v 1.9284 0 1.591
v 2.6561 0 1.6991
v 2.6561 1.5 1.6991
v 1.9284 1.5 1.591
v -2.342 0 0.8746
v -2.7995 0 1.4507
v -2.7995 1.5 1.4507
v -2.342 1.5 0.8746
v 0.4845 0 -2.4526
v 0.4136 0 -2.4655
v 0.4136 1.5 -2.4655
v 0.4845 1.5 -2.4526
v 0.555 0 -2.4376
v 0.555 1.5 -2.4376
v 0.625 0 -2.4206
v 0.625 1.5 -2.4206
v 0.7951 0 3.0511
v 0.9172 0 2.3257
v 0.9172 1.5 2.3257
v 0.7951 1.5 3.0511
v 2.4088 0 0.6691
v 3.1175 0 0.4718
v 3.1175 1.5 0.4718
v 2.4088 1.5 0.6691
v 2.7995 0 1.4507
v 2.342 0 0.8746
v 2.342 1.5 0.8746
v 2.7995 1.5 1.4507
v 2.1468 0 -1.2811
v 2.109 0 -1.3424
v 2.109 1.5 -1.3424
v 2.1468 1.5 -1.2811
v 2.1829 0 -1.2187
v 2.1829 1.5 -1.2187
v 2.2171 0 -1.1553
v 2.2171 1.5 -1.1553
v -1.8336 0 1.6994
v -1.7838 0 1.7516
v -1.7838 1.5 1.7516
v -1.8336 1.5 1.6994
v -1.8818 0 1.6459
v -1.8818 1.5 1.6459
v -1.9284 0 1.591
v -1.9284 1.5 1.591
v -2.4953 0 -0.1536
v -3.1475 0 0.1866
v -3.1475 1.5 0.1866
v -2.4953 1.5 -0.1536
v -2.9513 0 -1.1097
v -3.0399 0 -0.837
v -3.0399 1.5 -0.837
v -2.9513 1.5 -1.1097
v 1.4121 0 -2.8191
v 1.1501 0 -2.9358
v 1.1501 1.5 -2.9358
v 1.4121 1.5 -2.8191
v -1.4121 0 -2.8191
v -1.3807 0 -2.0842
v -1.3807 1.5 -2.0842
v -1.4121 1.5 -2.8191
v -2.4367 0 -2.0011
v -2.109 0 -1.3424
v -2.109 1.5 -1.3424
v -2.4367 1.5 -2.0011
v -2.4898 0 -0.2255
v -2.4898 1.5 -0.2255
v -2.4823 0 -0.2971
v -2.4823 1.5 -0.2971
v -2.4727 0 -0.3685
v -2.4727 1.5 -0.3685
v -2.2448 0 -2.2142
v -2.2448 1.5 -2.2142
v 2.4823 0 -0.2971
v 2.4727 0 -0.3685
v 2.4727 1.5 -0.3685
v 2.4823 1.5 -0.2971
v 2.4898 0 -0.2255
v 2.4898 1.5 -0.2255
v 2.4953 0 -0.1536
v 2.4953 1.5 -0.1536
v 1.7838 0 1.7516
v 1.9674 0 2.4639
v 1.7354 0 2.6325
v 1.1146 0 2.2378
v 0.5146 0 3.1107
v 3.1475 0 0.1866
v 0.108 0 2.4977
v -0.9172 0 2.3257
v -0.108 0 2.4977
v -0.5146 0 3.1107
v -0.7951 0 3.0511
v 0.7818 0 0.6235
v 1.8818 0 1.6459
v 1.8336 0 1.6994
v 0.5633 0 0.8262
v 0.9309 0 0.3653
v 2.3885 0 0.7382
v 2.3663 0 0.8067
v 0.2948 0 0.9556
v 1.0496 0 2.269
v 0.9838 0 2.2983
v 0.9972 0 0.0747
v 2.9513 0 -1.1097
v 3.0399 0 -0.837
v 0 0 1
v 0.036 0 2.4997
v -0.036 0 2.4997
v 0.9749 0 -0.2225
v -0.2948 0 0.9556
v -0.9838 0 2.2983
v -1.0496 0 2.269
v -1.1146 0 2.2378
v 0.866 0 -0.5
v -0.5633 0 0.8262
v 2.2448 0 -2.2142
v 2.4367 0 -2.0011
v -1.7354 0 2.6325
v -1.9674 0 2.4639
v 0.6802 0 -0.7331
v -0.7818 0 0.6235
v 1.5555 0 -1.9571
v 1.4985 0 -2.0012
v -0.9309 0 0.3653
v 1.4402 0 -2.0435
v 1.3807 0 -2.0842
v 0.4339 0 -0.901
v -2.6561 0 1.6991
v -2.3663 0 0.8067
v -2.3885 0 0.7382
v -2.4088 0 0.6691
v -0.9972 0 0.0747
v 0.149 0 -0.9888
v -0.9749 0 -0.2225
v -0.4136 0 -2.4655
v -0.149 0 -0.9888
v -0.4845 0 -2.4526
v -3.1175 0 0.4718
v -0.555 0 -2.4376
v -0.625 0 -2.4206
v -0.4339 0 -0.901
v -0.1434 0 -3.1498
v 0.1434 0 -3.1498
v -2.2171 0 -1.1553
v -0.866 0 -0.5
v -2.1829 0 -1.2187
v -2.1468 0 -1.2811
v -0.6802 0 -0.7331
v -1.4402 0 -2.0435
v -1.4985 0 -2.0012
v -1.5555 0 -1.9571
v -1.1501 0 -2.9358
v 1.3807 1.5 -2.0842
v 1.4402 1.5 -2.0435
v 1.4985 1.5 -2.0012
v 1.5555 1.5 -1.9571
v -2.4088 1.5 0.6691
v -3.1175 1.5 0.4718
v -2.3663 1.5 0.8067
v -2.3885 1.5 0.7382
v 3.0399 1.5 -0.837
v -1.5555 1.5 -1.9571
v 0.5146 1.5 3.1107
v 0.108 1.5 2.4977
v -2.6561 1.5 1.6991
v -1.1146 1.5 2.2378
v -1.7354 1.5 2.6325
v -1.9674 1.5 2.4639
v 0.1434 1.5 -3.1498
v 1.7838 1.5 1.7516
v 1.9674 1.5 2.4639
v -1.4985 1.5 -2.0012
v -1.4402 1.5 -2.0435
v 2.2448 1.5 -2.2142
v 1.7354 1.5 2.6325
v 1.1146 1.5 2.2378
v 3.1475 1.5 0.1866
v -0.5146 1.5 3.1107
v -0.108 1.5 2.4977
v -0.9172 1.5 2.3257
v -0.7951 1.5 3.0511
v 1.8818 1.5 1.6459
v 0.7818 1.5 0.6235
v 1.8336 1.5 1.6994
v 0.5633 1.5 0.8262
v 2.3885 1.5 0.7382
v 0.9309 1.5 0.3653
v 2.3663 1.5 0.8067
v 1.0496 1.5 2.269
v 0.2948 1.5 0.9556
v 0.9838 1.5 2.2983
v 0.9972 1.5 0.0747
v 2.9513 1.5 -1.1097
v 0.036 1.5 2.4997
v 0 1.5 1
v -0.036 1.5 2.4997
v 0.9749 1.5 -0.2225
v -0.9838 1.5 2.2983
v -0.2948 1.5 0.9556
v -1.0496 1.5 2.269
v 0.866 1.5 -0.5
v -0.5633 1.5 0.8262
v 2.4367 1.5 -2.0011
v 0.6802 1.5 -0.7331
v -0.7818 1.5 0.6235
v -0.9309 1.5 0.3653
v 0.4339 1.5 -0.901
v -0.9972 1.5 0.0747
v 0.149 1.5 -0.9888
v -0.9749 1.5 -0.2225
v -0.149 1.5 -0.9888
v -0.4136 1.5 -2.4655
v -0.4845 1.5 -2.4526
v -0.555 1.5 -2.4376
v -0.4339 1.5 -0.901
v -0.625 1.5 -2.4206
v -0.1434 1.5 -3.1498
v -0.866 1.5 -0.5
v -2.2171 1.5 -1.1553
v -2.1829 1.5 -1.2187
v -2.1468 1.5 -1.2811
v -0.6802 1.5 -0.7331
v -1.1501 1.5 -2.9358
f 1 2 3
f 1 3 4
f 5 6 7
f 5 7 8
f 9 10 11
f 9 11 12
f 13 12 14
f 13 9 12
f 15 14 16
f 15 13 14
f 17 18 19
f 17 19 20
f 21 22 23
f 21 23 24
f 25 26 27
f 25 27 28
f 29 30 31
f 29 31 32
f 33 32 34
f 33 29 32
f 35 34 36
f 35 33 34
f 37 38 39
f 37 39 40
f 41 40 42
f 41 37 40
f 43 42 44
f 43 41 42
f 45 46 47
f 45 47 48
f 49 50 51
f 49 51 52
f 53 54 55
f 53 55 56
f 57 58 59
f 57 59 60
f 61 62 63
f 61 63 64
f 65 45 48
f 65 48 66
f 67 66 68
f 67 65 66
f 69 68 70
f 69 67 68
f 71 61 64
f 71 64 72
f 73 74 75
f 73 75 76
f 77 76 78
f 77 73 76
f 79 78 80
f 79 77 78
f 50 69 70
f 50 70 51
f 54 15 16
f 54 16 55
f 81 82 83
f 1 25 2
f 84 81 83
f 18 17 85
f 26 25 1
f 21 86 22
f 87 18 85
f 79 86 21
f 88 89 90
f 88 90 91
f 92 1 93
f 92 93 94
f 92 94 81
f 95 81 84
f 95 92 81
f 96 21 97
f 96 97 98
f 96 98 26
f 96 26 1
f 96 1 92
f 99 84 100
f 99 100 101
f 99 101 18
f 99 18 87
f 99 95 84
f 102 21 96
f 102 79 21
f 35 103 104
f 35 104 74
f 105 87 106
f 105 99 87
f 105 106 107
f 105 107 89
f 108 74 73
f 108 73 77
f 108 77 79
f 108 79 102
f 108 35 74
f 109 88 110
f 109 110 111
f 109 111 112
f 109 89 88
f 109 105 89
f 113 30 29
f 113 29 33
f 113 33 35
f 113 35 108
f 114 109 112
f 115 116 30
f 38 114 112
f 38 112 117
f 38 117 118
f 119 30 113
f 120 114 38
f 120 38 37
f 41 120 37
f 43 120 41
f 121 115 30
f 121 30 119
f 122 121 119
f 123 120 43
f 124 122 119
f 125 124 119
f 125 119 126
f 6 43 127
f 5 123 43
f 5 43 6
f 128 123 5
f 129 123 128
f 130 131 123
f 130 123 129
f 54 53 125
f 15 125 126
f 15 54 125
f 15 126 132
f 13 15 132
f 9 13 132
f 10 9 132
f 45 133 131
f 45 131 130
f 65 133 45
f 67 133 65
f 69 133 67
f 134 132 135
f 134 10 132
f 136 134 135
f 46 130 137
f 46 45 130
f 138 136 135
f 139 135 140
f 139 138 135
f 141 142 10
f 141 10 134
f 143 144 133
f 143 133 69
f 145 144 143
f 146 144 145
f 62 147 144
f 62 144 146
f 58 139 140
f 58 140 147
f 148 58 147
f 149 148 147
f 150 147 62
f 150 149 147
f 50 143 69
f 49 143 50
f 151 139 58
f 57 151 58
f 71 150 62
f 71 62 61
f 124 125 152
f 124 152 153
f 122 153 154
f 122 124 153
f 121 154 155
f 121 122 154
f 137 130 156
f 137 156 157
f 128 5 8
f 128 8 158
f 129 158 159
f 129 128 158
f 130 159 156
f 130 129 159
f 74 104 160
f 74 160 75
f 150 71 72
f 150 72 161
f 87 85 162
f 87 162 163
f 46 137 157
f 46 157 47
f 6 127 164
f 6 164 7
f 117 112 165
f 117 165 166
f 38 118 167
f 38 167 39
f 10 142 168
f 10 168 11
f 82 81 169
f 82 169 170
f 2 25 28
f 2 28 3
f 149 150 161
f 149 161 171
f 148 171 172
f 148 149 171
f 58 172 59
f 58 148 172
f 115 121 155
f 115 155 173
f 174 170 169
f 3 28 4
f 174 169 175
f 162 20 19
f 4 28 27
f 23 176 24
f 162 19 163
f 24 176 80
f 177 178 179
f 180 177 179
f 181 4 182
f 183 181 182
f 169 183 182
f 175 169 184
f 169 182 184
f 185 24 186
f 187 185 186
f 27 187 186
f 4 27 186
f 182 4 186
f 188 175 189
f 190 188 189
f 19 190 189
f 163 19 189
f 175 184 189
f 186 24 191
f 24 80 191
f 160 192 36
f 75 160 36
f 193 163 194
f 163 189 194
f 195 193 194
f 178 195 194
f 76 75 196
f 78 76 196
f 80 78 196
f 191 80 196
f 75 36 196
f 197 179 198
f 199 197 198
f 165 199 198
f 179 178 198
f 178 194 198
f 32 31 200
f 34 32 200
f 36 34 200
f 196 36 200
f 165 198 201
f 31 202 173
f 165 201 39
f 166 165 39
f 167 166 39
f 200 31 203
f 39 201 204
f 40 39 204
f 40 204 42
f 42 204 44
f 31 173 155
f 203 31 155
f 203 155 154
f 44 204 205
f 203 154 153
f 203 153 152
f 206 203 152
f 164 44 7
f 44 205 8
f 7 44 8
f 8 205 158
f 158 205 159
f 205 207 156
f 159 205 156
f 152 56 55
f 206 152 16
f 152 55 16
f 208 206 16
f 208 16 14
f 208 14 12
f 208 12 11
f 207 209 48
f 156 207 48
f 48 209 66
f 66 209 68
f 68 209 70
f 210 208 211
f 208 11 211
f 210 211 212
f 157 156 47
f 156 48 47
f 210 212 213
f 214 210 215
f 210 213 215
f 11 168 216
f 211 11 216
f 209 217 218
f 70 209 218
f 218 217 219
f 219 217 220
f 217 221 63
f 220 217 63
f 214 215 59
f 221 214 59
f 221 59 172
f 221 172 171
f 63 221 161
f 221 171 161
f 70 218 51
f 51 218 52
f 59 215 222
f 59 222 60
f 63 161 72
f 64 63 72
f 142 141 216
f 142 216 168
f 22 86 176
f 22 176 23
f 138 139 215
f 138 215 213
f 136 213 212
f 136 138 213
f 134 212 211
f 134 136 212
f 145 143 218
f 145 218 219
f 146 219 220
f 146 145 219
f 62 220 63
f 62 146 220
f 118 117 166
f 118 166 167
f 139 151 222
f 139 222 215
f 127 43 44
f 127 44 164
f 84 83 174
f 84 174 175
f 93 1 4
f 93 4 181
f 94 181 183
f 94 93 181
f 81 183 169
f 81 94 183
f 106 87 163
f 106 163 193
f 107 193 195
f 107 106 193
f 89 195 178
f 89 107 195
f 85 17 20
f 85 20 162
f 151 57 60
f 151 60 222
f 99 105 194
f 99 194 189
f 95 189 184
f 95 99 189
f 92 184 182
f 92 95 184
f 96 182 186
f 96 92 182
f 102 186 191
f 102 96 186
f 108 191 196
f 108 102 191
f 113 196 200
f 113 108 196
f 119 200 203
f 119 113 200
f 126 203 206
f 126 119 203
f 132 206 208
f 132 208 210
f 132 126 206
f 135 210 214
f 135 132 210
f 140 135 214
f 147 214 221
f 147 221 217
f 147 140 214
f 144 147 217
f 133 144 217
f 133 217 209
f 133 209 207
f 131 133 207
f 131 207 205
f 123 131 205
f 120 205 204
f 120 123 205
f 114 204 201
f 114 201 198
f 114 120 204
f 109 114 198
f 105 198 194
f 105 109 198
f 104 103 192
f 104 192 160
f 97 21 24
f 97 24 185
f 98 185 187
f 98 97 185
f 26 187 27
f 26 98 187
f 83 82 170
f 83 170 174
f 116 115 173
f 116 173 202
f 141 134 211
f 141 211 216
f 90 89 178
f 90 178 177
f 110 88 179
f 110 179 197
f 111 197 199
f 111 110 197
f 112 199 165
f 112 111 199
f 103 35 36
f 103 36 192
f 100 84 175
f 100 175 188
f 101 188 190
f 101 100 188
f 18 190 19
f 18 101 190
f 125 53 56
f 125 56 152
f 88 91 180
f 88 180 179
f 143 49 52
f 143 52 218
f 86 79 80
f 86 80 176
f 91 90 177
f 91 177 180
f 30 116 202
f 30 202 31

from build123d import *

# Parameters (mm, degrees)
SKETCH1_R           = 1
BOSS_EXTRUDE1_DEPTH = 1.5


with BuildPart() as part:
    # Sketch1 → Boss-Extrude1 (new body)
    with BuildSketch(Plane(origin=(0, 0, 0), x_dir=(1, 0, 0), z_dir=(0, 1, 0))):
        with BuildLine():
            Line((-0.4136064, 2.465548569), (-0.143377771, 3.149767964))
            Line((-0.143377771, 3.149767964), (0.143377771, 3.149767964))
            Line((0.143377771, 3.149767964), (0.4136064, 2.465548569))
            ThreePointArc((0.4136064, 2.465548569), (0.519779227, 2.445369002), (0.6249807, 2.420619575))
            Line((0.6249807, 2.420619575), (1.150143936, 2.935773209))
            Line((1.150143936, 2.935773209), (1.41210816, 2.819139222))
            Line((1.41210816, 2.819139222), (1.380677197, 2.084161817))
            ThreePointArc((1.380677197, 2.084161817), (1.469463131, 2.022542486), (1.55550296, 1.957143465))
            Line((1.55550296, 1.957143465), (2.244795308, 2.214156596))
            Line((2.244795308, 2.214156596), (2.436672219, 2.001055698))
            Line((2.436672219, 2.001055698), (2.109016362, 1.342404553))
            ThreePointArc((2.109016362, 1.342404553), (2.165063509, 1.25), (2.217064626, 1.15525947))
            Line((2.217064626, 1.15525947), (2.951301179, 1.109692193))
            Line((2.951301179, 1.109692193), (3.039913515, 0.836971465))
            Line((3.039913515, 0.836971465), (2.472687439, 0.368533346))
            ThreePointArc((2.472687439, 0.368533346), (2.486304738, 0.261321158), (2.495275677, 0.153620618))
            Line((2.495275677, 0.153620618), (3.147500263, -0.186648072))
            Line((3.147500263, -0.186648072), (3.117526147, -0.471832738))
            Line((3.117526147, -0.471832738), (2.408808394, -0.669060624))
            ThreePointArc((2.408808394, -0.669060624), (2.377641291, -0.772542486), (2.342030895, -0.874580635))
            Line((2.342030895, -0.874580635), (2.799467958, -1.450715189))
            Line((2.799467958, -1.450715189), (2.656090187, -1.699052774))
            Line((2.656090187, -1.699052774), (1.928424495, -1.590967934))
            ThreePointArc((1.928424495, -1.590967934), (1.857862064, -1.672826516), (1.783827694, -1.75155895))
            Line((1.783827694, -1.75155895), (1.967382211, -2.463940471))
            Line((1.967382211, -2.463940471), (1.735392103, -2.63249115))
            Line((1.735392103, -2.63249115), (1.114598481, -2.237782435))
            ThreePointArc((1.114598481, -2.237782435), (1.016841608, -2.283863644), (0.91718448, -2.325676811))
            Line((0.91718448, -2.325676811), (0.795118206, -3.051128062))
            Line((0.795118206, -3.051128062), (0.51462896, -3.110747891))
            Line((0.51462896, -3.110747891), (0.108048264, -2.497664023))
            ThreePointArc((0.108048264, -2.497664023), (0, -2.5), (-0.108048264, -2.497664023))
            Line((-0.108048264, -2.497664023), (-0.51462896, -3.110747891))
            Line((-0.51462896, -3.110747891), (-0.795118206, -3.051128062))
            Line((-0.795118206, -3.051128062), (-0.91718448, -2.325676811))
            ThreePointArc((-0.91718448, -2.325676811), (-1.016841608, -2.283863644), (-1.114598481, -2.237782435))
            Line((-1.114598481, -2.237782435), (-1.735392103, -2.63249115))
            Line((-1.735392103, -2.63249115), (-1.967382211, -2.463940471))
            Line((-1.967382211, -2.463940471), (-1.783827694, -1.75155895))
            ThreePointArc((-1.783827694, -1.75155895), (-1.857862064, -1.672826516), (-1.928424495, -1.590967934))
            Line((-1.928424495, -1.590967934), (-2.656090187, -1.699052774))
            Line((-2.656090187, -1.699052774), (-2.799467958, -1.450715189))
            Line((-2.799467958, -1.450715189), (-2.342030895, -0.874580635))
            ThreePointArc((-2.342030895, -0.874580635), (-2.377641291, -0.772542486), (-2.408808394, -0.669060624))
            Line((-2.408808394, -0.669060624), (-3.117526147, -0.471832738))
            Line((-3.117526147, -0.471832738), (-3.147500263, -0.186648072))
            Line((-3.147500263, -0.186648072), (-2.495275677, 0.153620618))
            ThreePointArc((-2.495275677, 0.153620618), (-2.486304738, 0.261321158), (-2.472687439, 0.368533346))
            Line((-2.472687439, 0.368533346), (-3.039913515, 0.836971465))
            Line((-3.039913515, 0.836971465), (-2.951301179, 1.109692193))
            Line((-2.951301179, 1.109692193), (-2.217064626, 1.15525947))
            ThreePointArc((-2.217064626, 1.15525947), (-2.165063509, 1.25), (-2.109016362, 1.342404553))
            Line((-2.109016362, 1.342404553), (-2.436672219, 2.001055698))
            Line((-2.436672219, 2.001055698), (-2.244795308, 2.214156596))
            Line((-2.244795308, 2.214156596), (-1.55550296, 1.957143465))
            ThreePointArc((-1.55550296, 1.957143465), (-1.469463131, 2.022542486), (-1.380677197, 2.084161817))
            Line((-1.380677197, 2.084161817), (-1.41210816, 2.819139222))
            Line((-1.41210816, 2.819139222), (-1.150143936, 2.935773209))
            Line((-1.150143936, 2.935773209), (-0.6249807, 2.420619575))
            ThreePointArc((-0.6249807, 2.420619575), (-0.519779227, 2.445369002), (-0.4136064, 2.465548569))
        make_face()
        with Locations(Location((0, 0, 0), (0, 0, 270))):
            Circle(SKETCH1_R, mode=Mode.SUBTRACT)
    extrude(amount=BOSS_EXTRUDE1_DEPTH)


solid = part.part
